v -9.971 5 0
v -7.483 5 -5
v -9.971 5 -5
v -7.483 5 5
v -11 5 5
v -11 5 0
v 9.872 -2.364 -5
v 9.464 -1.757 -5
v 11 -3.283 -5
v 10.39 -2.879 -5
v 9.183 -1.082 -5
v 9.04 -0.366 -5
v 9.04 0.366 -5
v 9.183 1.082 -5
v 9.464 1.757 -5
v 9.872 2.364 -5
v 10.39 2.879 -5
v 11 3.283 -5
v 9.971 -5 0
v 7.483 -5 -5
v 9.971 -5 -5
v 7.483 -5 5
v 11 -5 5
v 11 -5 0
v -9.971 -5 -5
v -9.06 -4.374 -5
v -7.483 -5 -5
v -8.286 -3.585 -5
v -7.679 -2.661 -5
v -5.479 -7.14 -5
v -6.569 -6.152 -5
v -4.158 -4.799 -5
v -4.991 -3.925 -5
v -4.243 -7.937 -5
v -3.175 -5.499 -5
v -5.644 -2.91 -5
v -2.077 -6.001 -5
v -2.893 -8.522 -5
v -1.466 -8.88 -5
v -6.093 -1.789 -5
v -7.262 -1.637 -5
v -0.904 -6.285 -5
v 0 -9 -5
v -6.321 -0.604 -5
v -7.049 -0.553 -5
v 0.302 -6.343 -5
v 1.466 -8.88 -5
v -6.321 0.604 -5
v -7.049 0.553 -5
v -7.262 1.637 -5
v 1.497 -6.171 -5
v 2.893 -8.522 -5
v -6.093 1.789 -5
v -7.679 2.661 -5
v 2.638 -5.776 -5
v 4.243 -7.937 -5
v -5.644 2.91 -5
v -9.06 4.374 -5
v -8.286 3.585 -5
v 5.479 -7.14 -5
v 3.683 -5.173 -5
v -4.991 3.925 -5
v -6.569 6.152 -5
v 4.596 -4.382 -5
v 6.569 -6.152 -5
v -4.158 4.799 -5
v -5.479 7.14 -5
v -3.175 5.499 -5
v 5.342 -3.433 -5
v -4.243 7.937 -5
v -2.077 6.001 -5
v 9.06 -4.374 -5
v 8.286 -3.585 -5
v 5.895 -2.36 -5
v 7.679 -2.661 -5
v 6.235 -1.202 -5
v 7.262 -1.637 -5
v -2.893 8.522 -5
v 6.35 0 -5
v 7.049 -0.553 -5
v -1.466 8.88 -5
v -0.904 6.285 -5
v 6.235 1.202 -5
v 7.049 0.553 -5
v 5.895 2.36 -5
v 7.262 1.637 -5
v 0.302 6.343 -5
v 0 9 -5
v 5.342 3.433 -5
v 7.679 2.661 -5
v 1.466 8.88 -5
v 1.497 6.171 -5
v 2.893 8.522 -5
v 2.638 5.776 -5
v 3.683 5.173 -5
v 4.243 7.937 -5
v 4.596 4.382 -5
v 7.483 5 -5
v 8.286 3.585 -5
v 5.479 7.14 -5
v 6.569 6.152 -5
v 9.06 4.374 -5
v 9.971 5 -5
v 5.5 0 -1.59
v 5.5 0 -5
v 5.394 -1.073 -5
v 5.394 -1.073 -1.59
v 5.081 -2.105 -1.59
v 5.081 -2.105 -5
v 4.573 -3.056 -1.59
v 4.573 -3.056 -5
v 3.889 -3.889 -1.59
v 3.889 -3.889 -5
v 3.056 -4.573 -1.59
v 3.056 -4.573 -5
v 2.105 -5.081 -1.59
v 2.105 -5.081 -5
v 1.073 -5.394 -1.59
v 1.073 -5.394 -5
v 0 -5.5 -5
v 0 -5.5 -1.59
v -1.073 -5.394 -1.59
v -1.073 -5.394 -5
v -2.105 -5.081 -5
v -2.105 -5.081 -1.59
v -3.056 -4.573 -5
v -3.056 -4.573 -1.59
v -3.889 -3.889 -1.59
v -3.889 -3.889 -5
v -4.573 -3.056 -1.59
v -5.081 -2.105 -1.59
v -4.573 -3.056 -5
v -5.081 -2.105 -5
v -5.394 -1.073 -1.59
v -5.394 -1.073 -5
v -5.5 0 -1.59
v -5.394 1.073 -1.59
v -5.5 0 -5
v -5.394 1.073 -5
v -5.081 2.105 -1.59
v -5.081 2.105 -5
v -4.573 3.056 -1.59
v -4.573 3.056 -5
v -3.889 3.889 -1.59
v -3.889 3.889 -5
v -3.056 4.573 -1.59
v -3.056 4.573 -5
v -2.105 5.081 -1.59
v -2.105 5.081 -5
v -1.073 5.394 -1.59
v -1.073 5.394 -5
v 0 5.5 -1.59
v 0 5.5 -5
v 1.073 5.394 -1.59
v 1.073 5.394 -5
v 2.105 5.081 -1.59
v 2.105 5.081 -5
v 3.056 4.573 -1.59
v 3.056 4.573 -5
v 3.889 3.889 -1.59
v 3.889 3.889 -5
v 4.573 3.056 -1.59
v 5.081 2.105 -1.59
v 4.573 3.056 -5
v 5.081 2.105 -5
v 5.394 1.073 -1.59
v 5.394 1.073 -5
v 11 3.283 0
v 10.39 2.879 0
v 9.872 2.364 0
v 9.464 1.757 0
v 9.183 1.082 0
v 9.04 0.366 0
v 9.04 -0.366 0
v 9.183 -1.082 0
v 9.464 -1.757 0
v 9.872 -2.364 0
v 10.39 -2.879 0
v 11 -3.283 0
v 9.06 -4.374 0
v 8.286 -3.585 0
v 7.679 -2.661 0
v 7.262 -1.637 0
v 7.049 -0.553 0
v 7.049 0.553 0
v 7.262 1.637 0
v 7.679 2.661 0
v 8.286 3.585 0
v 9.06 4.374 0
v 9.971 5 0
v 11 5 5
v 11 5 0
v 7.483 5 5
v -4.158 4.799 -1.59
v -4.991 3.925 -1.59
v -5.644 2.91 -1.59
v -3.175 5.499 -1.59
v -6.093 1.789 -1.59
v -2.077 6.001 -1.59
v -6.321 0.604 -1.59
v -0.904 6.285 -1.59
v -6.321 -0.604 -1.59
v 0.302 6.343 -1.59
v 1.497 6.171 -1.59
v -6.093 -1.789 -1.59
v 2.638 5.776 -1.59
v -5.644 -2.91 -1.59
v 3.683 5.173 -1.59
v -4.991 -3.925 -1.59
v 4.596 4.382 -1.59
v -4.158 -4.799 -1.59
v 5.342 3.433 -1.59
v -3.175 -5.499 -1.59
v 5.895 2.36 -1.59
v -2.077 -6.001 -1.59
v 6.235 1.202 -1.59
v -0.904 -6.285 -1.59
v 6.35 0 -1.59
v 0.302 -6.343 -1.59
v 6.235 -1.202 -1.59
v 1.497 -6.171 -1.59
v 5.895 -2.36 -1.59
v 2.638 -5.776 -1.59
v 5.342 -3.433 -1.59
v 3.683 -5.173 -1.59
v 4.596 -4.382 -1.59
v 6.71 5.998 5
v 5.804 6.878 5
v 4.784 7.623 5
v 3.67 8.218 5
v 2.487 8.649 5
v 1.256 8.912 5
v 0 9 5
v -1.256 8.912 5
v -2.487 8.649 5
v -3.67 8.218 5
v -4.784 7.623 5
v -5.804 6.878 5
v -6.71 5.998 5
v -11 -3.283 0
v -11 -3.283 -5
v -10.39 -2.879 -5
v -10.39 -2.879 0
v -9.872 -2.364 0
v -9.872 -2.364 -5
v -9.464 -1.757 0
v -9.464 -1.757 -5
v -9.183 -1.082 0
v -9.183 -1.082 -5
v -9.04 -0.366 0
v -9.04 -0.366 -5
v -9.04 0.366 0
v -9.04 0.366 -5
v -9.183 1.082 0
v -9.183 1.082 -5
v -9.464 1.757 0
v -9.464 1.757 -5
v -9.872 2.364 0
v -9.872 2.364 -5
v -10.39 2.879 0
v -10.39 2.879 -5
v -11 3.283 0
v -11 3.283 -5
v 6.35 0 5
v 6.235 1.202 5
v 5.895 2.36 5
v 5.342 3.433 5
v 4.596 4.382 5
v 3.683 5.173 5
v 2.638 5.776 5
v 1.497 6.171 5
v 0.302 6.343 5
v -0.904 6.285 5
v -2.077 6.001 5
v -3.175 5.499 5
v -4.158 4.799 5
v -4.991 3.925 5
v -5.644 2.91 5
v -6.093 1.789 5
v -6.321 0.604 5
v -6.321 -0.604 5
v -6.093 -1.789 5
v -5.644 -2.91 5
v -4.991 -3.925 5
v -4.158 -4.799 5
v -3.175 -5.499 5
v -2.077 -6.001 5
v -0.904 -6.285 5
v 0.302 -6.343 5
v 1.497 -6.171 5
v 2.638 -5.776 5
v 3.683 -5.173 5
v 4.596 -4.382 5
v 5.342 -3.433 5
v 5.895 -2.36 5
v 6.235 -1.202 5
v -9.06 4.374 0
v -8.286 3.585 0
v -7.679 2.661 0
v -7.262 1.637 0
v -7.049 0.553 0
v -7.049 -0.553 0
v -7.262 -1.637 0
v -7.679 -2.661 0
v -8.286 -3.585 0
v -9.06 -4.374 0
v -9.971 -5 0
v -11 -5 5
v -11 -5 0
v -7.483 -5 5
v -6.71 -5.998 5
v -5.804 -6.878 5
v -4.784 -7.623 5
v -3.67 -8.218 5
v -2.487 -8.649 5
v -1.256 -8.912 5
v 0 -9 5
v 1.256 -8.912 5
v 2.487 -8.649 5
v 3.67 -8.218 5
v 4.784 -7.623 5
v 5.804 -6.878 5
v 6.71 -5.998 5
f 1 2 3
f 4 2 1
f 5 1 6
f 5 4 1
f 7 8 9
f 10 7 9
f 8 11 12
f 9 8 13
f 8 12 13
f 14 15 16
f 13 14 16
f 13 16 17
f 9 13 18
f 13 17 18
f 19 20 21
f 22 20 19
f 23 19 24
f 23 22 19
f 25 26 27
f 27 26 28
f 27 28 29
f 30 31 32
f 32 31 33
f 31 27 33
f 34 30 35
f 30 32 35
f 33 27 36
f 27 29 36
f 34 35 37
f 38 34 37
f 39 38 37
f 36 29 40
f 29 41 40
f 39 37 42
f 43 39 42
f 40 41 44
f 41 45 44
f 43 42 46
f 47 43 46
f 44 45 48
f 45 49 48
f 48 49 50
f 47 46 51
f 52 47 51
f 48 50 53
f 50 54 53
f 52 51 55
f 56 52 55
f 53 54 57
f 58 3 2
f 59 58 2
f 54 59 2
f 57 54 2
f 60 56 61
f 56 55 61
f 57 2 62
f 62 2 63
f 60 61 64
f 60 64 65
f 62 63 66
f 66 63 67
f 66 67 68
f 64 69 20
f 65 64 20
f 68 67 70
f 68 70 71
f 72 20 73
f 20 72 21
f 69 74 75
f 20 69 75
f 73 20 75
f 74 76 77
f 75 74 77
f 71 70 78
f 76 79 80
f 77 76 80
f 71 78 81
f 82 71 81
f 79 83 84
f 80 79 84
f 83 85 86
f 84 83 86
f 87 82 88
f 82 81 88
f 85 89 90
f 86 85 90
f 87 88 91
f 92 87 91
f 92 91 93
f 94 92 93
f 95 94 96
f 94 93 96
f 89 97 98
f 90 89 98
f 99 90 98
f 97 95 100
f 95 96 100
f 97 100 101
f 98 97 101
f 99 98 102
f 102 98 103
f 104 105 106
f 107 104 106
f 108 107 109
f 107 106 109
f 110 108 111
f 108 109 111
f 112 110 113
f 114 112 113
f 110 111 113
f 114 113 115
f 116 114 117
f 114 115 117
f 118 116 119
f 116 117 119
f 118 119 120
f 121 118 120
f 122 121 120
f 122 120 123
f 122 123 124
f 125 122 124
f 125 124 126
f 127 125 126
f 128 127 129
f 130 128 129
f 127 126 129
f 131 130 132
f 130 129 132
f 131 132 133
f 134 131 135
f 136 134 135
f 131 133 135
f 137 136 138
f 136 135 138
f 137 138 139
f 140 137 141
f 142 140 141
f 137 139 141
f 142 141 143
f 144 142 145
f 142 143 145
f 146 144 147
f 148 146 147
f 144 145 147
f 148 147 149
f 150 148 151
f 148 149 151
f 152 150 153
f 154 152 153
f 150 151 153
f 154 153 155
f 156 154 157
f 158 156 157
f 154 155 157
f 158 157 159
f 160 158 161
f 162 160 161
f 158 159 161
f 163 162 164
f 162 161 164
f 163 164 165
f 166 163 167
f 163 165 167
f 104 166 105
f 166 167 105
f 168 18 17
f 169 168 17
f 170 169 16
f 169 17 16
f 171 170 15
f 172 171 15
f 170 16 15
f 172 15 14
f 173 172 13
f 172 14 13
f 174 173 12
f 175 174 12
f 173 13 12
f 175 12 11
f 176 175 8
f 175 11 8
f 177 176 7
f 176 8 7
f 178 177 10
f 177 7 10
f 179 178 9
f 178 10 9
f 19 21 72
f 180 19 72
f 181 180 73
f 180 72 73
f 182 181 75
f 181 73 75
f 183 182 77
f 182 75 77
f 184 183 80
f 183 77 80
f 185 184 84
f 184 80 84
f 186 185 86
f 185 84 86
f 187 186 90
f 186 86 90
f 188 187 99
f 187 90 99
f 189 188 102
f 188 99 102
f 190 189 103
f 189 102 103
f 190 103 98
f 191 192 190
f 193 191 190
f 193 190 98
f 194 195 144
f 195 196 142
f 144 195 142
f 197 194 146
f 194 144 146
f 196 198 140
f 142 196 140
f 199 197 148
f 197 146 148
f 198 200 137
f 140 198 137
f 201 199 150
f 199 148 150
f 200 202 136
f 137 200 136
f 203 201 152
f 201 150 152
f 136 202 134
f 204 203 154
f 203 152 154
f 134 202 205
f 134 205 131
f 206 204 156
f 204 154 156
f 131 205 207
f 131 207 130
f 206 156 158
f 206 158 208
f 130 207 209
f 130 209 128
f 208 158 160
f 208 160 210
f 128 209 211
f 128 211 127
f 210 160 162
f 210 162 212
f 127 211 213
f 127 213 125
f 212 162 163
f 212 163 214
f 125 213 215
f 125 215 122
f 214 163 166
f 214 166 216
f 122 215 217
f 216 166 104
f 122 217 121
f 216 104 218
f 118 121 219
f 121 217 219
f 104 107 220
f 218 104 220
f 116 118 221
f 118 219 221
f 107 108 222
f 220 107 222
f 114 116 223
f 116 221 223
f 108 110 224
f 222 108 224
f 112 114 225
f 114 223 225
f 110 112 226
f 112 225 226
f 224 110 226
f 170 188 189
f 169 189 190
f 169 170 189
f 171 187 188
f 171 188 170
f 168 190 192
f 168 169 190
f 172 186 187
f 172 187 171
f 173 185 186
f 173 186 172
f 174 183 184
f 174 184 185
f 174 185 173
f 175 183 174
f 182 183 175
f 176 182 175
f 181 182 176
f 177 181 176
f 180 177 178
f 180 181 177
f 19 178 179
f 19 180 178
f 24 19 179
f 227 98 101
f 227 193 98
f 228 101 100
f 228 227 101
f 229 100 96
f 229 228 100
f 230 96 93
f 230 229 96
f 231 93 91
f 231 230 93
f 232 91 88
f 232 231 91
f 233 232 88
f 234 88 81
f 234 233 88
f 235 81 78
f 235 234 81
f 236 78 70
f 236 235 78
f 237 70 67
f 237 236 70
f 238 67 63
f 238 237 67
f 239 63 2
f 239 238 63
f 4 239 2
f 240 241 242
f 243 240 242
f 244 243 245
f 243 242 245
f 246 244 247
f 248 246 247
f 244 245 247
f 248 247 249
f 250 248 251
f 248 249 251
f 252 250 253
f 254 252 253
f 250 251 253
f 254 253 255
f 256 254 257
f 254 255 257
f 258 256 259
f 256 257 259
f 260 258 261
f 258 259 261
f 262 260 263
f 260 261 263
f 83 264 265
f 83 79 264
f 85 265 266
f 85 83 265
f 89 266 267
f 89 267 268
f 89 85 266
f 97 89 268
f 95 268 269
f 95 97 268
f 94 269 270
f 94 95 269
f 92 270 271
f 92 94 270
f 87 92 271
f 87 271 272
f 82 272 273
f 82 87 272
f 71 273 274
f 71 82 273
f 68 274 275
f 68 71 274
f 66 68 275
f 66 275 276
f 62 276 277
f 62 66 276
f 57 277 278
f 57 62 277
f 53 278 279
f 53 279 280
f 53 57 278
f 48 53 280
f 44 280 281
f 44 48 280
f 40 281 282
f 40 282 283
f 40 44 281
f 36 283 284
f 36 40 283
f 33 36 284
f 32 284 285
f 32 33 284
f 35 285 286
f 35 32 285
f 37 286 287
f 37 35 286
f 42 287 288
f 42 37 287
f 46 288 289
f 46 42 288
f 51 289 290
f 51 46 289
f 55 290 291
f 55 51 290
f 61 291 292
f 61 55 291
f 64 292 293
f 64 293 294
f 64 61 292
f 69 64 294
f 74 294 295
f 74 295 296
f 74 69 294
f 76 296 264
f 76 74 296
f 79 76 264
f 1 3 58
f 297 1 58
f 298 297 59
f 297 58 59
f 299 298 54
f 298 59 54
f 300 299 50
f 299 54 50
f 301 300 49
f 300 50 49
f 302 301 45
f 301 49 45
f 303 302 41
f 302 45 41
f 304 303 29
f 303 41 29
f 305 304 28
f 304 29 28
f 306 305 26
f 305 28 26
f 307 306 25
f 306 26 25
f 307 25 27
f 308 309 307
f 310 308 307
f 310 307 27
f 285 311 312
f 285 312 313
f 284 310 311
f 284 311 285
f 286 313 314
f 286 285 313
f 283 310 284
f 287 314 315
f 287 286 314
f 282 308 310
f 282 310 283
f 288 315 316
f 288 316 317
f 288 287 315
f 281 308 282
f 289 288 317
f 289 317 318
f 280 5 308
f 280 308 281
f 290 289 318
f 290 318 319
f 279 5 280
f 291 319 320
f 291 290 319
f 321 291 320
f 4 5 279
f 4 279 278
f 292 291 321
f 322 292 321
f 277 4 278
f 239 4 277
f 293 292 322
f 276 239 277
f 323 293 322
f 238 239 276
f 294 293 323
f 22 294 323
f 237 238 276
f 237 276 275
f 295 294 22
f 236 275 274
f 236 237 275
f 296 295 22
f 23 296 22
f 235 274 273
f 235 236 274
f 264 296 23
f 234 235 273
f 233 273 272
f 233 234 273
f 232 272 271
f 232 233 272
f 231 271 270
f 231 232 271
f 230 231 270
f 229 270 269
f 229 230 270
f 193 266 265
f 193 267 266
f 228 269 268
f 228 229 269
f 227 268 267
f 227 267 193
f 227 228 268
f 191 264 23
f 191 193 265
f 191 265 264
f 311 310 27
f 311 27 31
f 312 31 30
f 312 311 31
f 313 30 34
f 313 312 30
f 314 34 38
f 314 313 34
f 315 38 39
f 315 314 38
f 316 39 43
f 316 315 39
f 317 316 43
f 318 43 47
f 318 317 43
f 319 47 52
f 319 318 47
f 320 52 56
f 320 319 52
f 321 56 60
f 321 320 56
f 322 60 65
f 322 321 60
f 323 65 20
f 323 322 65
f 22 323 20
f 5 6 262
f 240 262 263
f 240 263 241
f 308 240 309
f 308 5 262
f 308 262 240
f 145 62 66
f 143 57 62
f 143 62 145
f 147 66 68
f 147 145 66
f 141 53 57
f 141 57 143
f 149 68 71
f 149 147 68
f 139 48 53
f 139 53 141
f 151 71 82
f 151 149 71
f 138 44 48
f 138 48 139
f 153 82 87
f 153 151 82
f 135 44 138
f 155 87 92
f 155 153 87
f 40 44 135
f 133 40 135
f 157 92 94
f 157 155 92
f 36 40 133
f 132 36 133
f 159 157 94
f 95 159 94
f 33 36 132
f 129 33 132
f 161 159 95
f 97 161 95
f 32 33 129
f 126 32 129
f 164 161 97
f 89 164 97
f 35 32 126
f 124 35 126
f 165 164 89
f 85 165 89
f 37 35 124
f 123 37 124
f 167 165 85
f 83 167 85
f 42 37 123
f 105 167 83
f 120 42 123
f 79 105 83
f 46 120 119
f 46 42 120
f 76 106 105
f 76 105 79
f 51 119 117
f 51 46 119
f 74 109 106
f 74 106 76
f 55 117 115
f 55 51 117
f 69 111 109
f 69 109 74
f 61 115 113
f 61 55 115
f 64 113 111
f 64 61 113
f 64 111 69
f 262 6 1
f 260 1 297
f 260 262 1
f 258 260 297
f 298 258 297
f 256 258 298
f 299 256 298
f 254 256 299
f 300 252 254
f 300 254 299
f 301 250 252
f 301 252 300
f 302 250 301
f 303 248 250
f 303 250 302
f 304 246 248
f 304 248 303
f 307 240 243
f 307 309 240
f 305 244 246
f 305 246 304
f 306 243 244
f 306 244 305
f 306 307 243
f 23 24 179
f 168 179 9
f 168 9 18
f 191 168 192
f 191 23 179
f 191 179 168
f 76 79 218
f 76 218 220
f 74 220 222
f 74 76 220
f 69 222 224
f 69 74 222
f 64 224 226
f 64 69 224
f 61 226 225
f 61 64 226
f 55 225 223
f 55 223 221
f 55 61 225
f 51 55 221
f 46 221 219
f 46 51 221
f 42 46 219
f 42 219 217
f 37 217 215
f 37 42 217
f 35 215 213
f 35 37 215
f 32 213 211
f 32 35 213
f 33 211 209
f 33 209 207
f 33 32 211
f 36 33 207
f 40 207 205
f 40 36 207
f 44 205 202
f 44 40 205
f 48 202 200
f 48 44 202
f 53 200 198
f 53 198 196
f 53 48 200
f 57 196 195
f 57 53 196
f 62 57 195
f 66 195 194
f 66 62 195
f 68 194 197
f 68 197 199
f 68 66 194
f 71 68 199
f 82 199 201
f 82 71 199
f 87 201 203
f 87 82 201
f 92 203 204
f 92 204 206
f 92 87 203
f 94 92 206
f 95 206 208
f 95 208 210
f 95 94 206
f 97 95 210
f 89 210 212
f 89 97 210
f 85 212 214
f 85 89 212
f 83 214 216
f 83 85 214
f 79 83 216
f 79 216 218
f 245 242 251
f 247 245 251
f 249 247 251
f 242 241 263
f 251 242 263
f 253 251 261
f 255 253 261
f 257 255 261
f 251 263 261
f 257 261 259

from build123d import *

# Parameters (mm, degrees)
F0_R     = 6.35
F1_DEPTH = 5
F3_DEPTH = 5
F5_DEPTH = 25
F6_R     = 6.35
F6_R_2   = 5.5
F7_DEPTH = 3.41


with BuildPart() as f1:
    # F0 (on Top) → F1 (new body, symmetric)
    with BuildSketch(Plane.XY):
        with BuildLine():
            Line((-11, -5), (-7.483315, -5))
            ThreePointArc((-7.483315, -5), (0, -9), (7.483315, -5))
            Line((7.483315, -5), (11, -5))
            Line((11, -5), (11, 5))
            Line((11, 5), (7.483315, 5))
            ThreePointArc((7.483315, 5), (0, 9), (-7.483315, 5))
            Line((-7.483315, 5), (-11, 5))
            Line((-11, 5), (-11, -5))
        make_face()
        Circle(F0_R, mode=Mode.SUBTRACT)
    extrude(amount=F1_DEPTH, both=True)

    # F2 (on face) → F3 (cut)
    with BuildSketch(Plane(origin=(0, 0, -5), x_dir=(1, 0, 0), z_dir=(0, 0, -1))):
        with BuildLine():
            ThreePointArc((-11, 3.282761), (-9.021953, 0), (-11, -3.282761))
            Line((-11, -3.282761), (-11, -5))
            Line((-11, -5), (-9.971136, -5))
            ThreePointArc((-9.971136, -5), (-7.021953, 0), (-9.971136, 5))
            Line((-9.971136, 5), (-11, 5))
            Line((-11, 5), (-11, 3.282761))
        make_face()
        with BuildLine():
            ThreePointArc((9.971136, 5), (7.021953, 0), (9.971136, -5))
            Line((9.971136, -5), (11, -5))
            Line((11, -5), (11, -3.282761))
            ThreePointArc((11, -3.282761), (9.021953, 0), (11, 3.282761))
            Line((11, 3.282761), (11, 5))
            Line((11, 5), (9.971136, 5))
        make_face()
    extrude(amount=-F3_DEPTH, mode=Mode.SUBTRACT)

    # F4 (on face) → F5 (cut)
    with BuildSketch(Plane.XY.offset(5)):
        with BuildLine():
            ThreePointArc((3.670103, 8.217685), (0, 9), (-3.670103, 8.217685))
            Line((-3.670103, 8.217685), (3.670103, 8.217685))
        make_face()
        with BuildLine():
            Line((3.670103, -8.217685), (-3.670103, -8.217685))
            ThreePointArc((-3.670103, -8.217685), (0, -9), (3.670103, -8.217685))
        make_face()
    extrude(amount=F5_DEPTH, mode=Mode.SUBTRACT)


with BuildPart() as f7:
    # F6 (on face) → F7 (new body)
    with BuildSketch(Plane(origin=(0, 0, -5), x_dir=(1, 0, 0), z_dir=(0, 0, -1))):
        Circle(F6_R)
        Circle(F6_R_2, mode=Mode.SUBTRACT)
    extrude(amount=-F7_DEPTH)


solid = Compound([f1.part, f7.part])
